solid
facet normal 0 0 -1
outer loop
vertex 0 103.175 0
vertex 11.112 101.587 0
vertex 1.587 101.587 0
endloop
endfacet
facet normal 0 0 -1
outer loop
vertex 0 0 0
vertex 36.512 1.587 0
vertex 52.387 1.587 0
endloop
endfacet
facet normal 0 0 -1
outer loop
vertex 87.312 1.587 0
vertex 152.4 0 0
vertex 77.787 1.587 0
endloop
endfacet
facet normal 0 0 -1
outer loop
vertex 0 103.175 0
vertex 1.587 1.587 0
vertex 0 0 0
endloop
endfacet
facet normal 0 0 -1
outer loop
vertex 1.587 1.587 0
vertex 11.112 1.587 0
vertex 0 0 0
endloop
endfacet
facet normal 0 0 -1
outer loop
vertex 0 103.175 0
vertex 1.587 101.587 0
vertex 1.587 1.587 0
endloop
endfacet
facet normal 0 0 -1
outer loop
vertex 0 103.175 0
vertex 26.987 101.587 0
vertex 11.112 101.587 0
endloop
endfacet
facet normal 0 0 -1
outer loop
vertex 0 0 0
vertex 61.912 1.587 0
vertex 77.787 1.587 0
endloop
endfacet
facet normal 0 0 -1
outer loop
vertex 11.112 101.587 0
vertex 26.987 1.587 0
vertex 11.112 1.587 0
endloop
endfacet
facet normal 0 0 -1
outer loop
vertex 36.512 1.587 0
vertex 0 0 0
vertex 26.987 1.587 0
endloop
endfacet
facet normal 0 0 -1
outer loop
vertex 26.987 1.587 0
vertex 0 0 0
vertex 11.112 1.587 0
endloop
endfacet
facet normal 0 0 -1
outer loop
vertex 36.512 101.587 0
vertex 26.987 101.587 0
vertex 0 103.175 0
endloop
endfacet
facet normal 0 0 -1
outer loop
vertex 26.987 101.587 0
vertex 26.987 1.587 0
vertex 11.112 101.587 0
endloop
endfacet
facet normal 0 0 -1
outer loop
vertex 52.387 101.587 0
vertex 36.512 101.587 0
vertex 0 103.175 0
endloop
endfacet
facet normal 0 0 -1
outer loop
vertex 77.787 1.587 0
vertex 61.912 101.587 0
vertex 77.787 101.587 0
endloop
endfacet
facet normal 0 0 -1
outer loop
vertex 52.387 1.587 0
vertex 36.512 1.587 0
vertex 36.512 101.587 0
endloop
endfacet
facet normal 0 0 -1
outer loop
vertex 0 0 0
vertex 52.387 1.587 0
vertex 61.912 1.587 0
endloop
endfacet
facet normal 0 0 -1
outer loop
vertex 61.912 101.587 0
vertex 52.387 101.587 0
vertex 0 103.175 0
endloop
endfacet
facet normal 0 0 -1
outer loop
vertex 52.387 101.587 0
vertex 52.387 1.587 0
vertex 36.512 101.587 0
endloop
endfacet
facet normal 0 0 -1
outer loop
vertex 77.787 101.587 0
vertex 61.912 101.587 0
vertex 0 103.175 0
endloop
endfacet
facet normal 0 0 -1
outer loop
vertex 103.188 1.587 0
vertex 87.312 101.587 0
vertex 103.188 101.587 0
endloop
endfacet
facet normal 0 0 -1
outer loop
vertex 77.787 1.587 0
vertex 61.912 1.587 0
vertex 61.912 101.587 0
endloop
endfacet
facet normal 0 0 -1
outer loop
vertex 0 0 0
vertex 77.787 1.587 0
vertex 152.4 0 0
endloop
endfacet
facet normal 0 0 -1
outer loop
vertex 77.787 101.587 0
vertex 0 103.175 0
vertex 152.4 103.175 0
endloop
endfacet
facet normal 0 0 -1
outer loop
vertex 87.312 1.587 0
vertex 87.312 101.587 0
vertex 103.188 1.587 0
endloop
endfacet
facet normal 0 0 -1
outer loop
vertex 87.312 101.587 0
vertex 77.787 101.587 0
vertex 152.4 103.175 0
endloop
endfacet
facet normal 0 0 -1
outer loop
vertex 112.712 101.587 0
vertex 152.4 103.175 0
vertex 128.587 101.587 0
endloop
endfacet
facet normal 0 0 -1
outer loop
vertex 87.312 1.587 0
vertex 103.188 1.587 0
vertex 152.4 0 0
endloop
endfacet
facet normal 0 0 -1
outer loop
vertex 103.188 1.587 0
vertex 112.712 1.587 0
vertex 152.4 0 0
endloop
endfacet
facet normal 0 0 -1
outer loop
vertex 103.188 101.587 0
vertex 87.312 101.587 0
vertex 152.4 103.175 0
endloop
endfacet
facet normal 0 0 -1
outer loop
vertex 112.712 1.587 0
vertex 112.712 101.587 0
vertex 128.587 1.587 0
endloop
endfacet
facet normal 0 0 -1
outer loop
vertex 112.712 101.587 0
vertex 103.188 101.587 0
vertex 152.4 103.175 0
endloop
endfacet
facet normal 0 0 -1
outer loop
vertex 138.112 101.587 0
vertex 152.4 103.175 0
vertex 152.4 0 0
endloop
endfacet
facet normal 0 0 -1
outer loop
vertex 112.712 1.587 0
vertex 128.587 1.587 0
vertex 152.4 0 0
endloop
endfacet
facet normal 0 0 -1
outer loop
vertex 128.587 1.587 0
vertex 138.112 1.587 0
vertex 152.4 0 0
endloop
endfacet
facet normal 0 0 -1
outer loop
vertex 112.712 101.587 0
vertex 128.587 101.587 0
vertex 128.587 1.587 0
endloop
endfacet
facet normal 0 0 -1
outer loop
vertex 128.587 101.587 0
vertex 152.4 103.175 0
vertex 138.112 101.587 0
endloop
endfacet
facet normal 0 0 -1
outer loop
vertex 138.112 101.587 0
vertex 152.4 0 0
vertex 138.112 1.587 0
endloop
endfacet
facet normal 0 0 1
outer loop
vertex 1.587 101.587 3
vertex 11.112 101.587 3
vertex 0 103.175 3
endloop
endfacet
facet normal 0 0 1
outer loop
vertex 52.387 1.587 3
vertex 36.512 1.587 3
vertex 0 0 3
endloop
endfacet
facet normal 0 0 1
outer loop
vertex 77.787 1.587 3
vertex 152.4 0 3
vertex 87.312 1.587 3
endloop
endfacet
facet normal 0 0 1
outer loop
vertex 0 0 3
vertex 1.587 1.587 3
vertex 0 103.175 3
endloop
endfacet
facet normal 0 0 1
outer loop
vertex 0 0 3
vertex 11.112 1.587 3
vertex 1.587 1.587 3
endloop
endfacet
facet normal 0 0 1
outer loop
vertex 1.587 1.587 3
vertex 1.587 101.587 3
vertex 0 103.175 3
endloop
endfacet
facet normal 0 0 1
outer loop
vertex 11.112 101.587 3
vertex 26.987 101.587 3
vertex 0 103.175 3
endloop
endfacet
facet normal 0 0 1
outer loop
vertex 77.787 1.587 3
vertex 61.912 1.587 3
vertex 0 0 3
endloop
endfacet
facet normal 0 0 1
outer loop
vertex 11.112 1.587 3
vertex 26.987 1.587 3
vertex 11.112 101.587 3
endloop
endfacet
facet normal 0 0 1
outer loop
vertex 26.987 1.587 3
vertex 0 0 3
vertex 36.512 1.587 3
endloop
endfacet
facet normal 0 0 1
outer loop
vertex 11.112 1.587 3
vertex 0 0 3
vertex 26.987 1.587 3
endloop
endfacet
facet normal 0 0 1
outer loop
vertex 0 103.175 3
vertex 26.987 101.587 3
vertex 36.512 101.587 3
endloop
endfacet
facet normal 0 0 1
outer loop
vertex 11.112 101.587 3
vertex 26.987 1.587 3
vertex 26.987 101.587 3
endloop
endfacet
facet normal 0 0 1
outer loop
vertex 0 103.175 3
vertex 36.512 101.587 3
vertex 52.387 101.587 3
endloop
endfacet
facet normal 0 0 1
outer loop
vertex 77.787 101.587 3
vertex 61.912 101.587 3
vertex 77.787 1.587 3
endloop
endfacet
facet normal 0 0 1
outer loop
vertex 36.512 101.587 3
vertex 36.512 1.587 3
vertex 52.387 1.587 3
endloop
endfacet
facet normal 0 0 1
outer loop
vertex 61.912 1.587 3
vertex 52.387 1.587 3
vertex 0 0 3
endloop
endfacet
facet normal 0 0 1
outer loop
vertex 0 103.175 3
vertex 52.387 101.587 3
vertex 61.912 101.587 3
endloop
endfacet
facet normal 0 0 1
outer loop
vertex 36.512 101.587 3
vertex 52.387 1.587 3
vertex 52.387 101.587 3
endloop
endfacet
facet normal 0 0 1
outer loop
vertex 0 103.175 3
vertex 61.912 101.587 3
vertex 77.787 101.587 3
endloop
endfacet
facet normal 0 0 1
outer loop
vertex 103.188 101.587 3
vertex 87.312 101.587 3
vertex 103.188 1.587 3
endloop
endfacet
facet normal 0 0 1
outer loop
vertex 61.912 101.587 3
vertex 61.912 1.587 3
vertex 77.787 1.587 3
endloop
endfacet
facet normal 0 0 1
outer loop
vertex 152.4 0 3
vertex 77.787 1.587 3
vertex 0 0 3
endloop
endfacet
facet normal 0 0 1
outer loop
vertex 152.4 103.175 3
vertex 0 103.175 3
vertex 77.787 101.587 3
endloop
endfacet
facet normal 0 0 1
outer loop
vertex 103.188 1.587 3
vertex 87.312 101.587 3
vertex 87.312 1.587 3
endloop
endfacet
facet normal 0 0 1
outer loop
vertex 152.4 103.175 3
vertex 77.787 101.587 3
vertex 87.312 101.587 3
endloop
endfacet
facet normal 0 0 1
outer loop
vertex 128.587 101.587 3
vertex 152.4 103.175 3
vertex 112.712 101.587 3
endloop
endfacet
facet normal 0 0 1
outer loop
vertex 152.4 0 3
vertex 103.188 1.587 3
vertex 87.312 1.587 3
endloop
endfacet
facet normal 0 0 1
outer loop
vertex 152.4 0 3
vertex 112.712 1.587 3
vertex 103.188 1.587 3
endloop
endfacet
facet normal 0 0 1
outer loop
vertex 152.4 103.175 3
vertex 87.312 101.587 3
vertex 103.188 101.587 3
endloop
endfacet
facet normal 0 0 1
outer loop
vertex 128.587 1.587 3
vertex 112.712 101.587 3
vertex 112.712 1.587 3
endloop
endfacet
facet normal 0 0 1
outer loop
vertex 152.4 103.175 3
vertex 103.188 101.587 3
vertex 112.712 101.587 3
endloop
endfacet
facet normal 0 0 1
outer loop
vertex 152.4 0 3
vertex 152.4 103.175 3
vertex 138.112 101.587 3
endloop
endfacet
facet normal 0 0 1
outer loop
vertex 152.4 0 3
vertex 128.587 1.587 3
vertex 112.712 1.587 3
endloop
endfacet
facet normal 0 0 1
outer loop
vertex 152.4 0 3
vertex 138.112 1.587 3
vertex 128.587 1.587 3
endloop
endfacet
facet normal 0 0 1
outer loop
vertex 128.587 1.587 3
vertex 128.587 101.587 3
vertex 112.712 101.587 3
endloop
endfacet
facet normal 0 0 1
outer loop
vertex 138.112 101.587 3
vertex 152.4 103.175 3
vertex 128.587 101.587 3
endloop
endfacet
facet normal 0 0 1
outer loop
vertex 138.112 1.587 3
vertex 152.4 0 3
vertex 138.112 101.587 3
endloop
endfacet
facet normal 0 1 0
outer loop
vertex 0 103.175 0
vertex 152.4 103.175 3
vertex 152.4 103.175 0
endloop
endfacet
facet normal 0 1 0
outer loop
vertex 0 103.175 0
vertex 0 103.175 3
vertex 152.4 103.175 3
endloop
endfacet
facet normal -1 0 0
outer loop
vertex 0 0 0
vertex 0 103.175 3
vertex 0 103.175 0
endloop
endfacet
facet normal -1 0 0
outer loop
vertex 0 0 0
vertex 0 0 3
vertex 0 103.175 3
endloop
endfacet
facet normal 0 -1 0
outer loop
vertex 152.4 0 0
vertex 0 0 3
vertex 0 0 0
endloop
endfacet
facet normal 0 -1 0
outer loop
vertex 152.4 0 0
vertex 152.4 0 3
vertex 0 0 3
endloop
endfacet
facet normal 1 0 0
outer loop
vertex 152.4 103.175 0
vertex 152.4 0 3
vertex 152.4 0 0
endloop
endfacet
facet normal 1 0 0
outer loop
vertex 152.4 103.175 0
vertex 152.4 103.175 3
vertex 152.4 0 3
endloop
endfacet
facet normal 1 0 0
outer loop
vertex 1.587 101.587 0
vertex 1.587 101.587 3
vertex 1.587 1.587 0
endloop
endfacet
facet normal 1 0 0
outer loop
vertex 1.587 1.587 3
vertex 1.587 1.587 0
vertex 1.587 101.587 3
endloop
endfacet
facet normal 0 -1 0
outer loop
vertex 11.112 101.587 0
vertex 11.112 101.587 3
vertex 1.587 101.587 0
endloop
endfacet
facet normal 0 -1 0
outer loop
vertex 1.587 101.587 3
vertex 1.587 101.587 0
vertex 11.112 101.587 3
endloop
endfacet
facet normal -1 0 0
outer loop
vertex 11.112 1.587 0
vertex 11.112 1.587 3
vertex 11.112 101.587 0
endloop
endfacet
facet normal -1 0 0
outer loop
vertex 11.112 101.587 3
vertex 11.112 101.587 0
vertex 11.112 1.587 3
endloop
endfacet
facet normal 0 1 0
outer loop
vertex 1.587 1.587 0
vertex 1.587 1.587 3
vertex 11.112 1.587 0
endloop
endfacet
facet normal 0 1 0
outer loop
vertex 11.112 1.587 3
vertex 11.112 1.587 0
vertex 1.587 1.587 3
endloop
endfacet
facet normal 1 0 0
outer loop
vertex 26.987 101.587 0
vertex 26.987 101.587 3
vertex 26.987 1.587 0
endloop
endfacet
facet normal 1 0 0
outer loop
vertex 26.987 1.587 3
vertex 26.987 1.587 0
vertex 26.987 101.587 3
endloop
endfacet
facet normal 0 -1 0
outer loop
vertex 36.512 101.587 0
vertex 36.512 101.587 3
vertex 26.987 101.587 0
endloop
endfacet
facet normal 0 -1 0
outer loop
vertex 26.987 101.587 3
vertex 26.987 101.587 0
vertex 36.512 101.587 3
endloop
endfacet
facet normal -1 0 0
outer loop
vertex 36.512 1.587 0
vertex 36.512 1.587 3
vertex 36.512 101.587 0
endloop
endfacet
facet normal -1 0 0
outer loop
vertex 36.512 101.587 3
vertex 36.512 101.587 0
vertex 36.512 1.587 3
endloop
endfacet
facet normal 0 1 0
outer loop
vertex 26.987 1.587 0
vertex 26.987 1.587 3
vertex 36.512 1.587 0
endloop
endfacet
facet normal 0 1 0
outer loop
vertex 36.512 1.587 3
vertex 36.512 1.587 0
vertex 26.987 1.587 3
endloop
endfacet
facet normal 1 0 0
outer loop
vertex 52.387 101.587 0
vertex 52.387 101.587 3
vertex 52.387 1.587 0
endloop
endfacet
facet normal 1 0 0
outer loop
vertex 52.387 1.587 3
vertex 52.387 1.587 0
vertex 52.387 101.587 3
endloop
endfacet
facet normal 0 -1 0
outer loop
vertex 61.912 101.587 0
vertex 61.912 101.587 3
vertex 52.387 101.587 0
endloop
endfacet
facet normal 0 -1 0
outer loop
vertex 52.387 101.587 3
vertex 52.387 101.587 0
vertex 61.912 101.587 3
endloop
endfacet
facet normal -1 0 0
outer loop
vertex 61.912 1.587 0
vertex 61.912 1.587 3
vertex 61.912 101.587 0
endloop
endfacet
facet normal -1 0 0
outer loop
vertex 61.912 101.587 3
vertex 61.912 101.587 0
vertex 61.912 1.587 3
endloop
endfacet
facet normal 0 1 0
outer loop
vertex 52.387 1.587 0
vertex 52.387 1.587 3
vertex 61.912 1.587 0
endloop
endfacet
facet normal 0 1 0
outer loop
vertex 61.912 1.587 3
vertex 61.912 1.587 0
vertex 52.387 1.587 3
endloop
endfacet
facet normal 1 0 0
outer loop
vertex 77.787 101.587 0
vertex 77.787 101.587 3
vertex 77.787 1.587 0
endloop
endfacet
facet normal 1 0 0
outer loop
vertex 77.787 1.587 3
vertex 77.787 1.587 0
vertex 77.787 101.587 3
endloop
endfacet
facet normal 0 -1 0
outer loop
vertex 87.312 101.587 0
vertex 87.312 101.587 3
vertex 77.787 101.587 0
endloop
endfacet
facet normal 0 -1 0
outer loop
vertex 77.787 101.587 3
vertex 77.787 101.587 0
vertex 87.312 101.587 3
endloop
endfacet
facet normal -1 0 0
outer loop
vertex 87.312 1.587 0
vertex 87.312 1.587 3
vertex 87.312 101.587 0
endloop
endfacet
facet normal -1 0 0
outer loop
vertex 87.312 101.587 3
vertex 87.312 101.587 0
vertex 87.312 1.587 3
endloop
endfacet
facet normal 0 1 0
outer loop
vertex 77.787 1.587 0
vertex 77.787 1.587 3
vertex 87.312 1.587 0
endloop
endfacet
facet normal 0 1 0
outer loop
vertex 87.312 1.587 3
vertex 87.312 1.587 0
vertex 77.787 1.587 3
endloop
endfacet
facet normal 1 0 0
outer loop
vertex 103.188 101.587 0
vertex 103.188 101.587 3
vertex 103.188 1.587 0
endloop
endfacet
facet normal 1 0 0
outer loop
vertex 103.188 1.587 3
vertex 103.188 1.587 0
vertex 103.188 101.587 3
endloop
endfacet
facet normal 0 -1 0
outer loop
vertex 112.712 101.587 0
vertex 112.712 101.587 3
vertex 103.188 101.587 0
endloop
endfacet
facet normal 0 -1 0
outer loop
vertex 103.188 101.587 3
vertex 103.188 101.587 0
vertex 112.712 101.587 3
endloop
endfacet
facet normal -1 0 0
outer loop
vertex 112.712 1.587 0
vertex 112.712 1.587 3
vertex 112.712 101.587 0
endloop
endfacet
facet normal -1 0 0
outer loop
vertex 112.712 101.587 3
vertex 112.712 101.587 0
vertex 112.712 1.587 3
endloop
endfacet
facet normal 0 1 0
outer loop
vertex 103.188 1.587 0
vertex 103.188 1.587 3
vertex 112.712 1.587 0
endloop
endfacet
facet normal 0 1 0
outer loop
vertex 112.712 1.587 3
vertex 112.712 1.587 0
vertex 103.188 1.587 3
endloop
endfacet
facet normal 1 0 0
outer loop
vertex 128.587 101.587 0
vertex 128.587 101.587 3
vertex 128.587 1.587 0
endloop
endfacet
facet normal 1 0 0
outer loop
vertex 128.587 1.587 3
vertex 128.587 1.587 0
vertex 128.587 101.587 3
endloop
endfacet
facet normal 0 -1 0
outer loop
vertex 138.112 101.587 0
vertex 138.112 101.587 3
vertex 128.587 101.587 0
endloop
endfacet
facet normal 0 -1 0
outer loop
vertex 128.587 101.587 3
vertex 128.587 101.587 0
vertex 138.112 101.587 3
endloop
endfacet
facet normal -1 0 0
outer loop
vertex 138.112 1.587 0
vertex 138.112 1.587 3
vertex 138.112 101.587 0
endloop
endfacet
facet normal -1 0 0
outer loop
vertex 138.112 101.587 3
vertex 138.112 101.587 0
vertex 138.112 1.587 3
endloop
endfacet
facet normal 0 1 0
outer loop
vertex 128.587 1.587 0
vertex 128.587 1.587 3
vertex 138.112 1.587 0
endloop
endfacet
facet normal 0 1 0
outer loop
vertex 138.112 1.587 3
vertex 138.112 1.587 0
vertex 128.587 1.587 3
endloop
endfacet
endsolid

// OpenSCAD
// Shank

INCH = 25.4;

overallLength = 2.25*INCH;
shank = 0.125*INCH;
bit = 0.25*INCH;
bitLength = 0.75*INCH;

target = 0.5 * INCH;

offset = (bit - shank) / 2;
minWidth = 150;
slotDepth = 100;
slots = floor((minWidth-2*offset)/target);
slotWidth = target - 2*offset;

panelWidth = target*(slots+1);
panelHeight = slotDepth+2*offset;
panelThickness = 3;

module frame() {
    color("blue")
    translate([-panelThickness, -panelThickness, -panelThickness])
    {
        difference() {
            union() {
                // Main Plate
                linear_extrude(height=panelThickness)
                square([panelWidth+2*panelThickness, panelHeight+2*panelThickness]);
                
                // Pattern Plate Holder
                linear_extrude(height=2*panelThickness)
                square([panelThickness, panelHeight+2*panelThickness]);
                
                linear_extrude(height=2*panelThickness)
                square([panelWidth+2*panelThickness, panelThickness]);
                
                translate([panelThickness+panelWidth, 0, 0])
                linear_extrude(height=2*panelThickness)
                square([panelThickness, panelHeight+2*panelThickness]);
                
                translate([0, panelThickness+panelHeight, 0])
                linear_extrude(height=2*panelThickness)
                square([panelWidth+2*panelThickness, panelThickness]);
            }
            
            // 
            translate([panelThickness+offset, panelThickness+offset, -1])
            linear_extrude(height=panelThickness+1)
            square([panelWidth-2*offset, panelHeight-2*offset]);
        }
    }
}

module bit() {
    translate([bit/2, bit/2, -1*INCH])
    {
        union() {
            cylinder(h=overallLength, d=shank);
            cylinder(h=bitLength, d=bit);
        }
    }
}

module panel() {
    
    linear_extrude(height=panelThickness) {
        difference() {
            square([panelWidth,panelHeight]);

            for(i =[1:slots])
            {
                translate([(2*(i-1)*target) + offset, offset, 0])
                {
                    square([slotWidth, slotDepth]);
                }
            }
        }
    }
}

//bit();
panel();
